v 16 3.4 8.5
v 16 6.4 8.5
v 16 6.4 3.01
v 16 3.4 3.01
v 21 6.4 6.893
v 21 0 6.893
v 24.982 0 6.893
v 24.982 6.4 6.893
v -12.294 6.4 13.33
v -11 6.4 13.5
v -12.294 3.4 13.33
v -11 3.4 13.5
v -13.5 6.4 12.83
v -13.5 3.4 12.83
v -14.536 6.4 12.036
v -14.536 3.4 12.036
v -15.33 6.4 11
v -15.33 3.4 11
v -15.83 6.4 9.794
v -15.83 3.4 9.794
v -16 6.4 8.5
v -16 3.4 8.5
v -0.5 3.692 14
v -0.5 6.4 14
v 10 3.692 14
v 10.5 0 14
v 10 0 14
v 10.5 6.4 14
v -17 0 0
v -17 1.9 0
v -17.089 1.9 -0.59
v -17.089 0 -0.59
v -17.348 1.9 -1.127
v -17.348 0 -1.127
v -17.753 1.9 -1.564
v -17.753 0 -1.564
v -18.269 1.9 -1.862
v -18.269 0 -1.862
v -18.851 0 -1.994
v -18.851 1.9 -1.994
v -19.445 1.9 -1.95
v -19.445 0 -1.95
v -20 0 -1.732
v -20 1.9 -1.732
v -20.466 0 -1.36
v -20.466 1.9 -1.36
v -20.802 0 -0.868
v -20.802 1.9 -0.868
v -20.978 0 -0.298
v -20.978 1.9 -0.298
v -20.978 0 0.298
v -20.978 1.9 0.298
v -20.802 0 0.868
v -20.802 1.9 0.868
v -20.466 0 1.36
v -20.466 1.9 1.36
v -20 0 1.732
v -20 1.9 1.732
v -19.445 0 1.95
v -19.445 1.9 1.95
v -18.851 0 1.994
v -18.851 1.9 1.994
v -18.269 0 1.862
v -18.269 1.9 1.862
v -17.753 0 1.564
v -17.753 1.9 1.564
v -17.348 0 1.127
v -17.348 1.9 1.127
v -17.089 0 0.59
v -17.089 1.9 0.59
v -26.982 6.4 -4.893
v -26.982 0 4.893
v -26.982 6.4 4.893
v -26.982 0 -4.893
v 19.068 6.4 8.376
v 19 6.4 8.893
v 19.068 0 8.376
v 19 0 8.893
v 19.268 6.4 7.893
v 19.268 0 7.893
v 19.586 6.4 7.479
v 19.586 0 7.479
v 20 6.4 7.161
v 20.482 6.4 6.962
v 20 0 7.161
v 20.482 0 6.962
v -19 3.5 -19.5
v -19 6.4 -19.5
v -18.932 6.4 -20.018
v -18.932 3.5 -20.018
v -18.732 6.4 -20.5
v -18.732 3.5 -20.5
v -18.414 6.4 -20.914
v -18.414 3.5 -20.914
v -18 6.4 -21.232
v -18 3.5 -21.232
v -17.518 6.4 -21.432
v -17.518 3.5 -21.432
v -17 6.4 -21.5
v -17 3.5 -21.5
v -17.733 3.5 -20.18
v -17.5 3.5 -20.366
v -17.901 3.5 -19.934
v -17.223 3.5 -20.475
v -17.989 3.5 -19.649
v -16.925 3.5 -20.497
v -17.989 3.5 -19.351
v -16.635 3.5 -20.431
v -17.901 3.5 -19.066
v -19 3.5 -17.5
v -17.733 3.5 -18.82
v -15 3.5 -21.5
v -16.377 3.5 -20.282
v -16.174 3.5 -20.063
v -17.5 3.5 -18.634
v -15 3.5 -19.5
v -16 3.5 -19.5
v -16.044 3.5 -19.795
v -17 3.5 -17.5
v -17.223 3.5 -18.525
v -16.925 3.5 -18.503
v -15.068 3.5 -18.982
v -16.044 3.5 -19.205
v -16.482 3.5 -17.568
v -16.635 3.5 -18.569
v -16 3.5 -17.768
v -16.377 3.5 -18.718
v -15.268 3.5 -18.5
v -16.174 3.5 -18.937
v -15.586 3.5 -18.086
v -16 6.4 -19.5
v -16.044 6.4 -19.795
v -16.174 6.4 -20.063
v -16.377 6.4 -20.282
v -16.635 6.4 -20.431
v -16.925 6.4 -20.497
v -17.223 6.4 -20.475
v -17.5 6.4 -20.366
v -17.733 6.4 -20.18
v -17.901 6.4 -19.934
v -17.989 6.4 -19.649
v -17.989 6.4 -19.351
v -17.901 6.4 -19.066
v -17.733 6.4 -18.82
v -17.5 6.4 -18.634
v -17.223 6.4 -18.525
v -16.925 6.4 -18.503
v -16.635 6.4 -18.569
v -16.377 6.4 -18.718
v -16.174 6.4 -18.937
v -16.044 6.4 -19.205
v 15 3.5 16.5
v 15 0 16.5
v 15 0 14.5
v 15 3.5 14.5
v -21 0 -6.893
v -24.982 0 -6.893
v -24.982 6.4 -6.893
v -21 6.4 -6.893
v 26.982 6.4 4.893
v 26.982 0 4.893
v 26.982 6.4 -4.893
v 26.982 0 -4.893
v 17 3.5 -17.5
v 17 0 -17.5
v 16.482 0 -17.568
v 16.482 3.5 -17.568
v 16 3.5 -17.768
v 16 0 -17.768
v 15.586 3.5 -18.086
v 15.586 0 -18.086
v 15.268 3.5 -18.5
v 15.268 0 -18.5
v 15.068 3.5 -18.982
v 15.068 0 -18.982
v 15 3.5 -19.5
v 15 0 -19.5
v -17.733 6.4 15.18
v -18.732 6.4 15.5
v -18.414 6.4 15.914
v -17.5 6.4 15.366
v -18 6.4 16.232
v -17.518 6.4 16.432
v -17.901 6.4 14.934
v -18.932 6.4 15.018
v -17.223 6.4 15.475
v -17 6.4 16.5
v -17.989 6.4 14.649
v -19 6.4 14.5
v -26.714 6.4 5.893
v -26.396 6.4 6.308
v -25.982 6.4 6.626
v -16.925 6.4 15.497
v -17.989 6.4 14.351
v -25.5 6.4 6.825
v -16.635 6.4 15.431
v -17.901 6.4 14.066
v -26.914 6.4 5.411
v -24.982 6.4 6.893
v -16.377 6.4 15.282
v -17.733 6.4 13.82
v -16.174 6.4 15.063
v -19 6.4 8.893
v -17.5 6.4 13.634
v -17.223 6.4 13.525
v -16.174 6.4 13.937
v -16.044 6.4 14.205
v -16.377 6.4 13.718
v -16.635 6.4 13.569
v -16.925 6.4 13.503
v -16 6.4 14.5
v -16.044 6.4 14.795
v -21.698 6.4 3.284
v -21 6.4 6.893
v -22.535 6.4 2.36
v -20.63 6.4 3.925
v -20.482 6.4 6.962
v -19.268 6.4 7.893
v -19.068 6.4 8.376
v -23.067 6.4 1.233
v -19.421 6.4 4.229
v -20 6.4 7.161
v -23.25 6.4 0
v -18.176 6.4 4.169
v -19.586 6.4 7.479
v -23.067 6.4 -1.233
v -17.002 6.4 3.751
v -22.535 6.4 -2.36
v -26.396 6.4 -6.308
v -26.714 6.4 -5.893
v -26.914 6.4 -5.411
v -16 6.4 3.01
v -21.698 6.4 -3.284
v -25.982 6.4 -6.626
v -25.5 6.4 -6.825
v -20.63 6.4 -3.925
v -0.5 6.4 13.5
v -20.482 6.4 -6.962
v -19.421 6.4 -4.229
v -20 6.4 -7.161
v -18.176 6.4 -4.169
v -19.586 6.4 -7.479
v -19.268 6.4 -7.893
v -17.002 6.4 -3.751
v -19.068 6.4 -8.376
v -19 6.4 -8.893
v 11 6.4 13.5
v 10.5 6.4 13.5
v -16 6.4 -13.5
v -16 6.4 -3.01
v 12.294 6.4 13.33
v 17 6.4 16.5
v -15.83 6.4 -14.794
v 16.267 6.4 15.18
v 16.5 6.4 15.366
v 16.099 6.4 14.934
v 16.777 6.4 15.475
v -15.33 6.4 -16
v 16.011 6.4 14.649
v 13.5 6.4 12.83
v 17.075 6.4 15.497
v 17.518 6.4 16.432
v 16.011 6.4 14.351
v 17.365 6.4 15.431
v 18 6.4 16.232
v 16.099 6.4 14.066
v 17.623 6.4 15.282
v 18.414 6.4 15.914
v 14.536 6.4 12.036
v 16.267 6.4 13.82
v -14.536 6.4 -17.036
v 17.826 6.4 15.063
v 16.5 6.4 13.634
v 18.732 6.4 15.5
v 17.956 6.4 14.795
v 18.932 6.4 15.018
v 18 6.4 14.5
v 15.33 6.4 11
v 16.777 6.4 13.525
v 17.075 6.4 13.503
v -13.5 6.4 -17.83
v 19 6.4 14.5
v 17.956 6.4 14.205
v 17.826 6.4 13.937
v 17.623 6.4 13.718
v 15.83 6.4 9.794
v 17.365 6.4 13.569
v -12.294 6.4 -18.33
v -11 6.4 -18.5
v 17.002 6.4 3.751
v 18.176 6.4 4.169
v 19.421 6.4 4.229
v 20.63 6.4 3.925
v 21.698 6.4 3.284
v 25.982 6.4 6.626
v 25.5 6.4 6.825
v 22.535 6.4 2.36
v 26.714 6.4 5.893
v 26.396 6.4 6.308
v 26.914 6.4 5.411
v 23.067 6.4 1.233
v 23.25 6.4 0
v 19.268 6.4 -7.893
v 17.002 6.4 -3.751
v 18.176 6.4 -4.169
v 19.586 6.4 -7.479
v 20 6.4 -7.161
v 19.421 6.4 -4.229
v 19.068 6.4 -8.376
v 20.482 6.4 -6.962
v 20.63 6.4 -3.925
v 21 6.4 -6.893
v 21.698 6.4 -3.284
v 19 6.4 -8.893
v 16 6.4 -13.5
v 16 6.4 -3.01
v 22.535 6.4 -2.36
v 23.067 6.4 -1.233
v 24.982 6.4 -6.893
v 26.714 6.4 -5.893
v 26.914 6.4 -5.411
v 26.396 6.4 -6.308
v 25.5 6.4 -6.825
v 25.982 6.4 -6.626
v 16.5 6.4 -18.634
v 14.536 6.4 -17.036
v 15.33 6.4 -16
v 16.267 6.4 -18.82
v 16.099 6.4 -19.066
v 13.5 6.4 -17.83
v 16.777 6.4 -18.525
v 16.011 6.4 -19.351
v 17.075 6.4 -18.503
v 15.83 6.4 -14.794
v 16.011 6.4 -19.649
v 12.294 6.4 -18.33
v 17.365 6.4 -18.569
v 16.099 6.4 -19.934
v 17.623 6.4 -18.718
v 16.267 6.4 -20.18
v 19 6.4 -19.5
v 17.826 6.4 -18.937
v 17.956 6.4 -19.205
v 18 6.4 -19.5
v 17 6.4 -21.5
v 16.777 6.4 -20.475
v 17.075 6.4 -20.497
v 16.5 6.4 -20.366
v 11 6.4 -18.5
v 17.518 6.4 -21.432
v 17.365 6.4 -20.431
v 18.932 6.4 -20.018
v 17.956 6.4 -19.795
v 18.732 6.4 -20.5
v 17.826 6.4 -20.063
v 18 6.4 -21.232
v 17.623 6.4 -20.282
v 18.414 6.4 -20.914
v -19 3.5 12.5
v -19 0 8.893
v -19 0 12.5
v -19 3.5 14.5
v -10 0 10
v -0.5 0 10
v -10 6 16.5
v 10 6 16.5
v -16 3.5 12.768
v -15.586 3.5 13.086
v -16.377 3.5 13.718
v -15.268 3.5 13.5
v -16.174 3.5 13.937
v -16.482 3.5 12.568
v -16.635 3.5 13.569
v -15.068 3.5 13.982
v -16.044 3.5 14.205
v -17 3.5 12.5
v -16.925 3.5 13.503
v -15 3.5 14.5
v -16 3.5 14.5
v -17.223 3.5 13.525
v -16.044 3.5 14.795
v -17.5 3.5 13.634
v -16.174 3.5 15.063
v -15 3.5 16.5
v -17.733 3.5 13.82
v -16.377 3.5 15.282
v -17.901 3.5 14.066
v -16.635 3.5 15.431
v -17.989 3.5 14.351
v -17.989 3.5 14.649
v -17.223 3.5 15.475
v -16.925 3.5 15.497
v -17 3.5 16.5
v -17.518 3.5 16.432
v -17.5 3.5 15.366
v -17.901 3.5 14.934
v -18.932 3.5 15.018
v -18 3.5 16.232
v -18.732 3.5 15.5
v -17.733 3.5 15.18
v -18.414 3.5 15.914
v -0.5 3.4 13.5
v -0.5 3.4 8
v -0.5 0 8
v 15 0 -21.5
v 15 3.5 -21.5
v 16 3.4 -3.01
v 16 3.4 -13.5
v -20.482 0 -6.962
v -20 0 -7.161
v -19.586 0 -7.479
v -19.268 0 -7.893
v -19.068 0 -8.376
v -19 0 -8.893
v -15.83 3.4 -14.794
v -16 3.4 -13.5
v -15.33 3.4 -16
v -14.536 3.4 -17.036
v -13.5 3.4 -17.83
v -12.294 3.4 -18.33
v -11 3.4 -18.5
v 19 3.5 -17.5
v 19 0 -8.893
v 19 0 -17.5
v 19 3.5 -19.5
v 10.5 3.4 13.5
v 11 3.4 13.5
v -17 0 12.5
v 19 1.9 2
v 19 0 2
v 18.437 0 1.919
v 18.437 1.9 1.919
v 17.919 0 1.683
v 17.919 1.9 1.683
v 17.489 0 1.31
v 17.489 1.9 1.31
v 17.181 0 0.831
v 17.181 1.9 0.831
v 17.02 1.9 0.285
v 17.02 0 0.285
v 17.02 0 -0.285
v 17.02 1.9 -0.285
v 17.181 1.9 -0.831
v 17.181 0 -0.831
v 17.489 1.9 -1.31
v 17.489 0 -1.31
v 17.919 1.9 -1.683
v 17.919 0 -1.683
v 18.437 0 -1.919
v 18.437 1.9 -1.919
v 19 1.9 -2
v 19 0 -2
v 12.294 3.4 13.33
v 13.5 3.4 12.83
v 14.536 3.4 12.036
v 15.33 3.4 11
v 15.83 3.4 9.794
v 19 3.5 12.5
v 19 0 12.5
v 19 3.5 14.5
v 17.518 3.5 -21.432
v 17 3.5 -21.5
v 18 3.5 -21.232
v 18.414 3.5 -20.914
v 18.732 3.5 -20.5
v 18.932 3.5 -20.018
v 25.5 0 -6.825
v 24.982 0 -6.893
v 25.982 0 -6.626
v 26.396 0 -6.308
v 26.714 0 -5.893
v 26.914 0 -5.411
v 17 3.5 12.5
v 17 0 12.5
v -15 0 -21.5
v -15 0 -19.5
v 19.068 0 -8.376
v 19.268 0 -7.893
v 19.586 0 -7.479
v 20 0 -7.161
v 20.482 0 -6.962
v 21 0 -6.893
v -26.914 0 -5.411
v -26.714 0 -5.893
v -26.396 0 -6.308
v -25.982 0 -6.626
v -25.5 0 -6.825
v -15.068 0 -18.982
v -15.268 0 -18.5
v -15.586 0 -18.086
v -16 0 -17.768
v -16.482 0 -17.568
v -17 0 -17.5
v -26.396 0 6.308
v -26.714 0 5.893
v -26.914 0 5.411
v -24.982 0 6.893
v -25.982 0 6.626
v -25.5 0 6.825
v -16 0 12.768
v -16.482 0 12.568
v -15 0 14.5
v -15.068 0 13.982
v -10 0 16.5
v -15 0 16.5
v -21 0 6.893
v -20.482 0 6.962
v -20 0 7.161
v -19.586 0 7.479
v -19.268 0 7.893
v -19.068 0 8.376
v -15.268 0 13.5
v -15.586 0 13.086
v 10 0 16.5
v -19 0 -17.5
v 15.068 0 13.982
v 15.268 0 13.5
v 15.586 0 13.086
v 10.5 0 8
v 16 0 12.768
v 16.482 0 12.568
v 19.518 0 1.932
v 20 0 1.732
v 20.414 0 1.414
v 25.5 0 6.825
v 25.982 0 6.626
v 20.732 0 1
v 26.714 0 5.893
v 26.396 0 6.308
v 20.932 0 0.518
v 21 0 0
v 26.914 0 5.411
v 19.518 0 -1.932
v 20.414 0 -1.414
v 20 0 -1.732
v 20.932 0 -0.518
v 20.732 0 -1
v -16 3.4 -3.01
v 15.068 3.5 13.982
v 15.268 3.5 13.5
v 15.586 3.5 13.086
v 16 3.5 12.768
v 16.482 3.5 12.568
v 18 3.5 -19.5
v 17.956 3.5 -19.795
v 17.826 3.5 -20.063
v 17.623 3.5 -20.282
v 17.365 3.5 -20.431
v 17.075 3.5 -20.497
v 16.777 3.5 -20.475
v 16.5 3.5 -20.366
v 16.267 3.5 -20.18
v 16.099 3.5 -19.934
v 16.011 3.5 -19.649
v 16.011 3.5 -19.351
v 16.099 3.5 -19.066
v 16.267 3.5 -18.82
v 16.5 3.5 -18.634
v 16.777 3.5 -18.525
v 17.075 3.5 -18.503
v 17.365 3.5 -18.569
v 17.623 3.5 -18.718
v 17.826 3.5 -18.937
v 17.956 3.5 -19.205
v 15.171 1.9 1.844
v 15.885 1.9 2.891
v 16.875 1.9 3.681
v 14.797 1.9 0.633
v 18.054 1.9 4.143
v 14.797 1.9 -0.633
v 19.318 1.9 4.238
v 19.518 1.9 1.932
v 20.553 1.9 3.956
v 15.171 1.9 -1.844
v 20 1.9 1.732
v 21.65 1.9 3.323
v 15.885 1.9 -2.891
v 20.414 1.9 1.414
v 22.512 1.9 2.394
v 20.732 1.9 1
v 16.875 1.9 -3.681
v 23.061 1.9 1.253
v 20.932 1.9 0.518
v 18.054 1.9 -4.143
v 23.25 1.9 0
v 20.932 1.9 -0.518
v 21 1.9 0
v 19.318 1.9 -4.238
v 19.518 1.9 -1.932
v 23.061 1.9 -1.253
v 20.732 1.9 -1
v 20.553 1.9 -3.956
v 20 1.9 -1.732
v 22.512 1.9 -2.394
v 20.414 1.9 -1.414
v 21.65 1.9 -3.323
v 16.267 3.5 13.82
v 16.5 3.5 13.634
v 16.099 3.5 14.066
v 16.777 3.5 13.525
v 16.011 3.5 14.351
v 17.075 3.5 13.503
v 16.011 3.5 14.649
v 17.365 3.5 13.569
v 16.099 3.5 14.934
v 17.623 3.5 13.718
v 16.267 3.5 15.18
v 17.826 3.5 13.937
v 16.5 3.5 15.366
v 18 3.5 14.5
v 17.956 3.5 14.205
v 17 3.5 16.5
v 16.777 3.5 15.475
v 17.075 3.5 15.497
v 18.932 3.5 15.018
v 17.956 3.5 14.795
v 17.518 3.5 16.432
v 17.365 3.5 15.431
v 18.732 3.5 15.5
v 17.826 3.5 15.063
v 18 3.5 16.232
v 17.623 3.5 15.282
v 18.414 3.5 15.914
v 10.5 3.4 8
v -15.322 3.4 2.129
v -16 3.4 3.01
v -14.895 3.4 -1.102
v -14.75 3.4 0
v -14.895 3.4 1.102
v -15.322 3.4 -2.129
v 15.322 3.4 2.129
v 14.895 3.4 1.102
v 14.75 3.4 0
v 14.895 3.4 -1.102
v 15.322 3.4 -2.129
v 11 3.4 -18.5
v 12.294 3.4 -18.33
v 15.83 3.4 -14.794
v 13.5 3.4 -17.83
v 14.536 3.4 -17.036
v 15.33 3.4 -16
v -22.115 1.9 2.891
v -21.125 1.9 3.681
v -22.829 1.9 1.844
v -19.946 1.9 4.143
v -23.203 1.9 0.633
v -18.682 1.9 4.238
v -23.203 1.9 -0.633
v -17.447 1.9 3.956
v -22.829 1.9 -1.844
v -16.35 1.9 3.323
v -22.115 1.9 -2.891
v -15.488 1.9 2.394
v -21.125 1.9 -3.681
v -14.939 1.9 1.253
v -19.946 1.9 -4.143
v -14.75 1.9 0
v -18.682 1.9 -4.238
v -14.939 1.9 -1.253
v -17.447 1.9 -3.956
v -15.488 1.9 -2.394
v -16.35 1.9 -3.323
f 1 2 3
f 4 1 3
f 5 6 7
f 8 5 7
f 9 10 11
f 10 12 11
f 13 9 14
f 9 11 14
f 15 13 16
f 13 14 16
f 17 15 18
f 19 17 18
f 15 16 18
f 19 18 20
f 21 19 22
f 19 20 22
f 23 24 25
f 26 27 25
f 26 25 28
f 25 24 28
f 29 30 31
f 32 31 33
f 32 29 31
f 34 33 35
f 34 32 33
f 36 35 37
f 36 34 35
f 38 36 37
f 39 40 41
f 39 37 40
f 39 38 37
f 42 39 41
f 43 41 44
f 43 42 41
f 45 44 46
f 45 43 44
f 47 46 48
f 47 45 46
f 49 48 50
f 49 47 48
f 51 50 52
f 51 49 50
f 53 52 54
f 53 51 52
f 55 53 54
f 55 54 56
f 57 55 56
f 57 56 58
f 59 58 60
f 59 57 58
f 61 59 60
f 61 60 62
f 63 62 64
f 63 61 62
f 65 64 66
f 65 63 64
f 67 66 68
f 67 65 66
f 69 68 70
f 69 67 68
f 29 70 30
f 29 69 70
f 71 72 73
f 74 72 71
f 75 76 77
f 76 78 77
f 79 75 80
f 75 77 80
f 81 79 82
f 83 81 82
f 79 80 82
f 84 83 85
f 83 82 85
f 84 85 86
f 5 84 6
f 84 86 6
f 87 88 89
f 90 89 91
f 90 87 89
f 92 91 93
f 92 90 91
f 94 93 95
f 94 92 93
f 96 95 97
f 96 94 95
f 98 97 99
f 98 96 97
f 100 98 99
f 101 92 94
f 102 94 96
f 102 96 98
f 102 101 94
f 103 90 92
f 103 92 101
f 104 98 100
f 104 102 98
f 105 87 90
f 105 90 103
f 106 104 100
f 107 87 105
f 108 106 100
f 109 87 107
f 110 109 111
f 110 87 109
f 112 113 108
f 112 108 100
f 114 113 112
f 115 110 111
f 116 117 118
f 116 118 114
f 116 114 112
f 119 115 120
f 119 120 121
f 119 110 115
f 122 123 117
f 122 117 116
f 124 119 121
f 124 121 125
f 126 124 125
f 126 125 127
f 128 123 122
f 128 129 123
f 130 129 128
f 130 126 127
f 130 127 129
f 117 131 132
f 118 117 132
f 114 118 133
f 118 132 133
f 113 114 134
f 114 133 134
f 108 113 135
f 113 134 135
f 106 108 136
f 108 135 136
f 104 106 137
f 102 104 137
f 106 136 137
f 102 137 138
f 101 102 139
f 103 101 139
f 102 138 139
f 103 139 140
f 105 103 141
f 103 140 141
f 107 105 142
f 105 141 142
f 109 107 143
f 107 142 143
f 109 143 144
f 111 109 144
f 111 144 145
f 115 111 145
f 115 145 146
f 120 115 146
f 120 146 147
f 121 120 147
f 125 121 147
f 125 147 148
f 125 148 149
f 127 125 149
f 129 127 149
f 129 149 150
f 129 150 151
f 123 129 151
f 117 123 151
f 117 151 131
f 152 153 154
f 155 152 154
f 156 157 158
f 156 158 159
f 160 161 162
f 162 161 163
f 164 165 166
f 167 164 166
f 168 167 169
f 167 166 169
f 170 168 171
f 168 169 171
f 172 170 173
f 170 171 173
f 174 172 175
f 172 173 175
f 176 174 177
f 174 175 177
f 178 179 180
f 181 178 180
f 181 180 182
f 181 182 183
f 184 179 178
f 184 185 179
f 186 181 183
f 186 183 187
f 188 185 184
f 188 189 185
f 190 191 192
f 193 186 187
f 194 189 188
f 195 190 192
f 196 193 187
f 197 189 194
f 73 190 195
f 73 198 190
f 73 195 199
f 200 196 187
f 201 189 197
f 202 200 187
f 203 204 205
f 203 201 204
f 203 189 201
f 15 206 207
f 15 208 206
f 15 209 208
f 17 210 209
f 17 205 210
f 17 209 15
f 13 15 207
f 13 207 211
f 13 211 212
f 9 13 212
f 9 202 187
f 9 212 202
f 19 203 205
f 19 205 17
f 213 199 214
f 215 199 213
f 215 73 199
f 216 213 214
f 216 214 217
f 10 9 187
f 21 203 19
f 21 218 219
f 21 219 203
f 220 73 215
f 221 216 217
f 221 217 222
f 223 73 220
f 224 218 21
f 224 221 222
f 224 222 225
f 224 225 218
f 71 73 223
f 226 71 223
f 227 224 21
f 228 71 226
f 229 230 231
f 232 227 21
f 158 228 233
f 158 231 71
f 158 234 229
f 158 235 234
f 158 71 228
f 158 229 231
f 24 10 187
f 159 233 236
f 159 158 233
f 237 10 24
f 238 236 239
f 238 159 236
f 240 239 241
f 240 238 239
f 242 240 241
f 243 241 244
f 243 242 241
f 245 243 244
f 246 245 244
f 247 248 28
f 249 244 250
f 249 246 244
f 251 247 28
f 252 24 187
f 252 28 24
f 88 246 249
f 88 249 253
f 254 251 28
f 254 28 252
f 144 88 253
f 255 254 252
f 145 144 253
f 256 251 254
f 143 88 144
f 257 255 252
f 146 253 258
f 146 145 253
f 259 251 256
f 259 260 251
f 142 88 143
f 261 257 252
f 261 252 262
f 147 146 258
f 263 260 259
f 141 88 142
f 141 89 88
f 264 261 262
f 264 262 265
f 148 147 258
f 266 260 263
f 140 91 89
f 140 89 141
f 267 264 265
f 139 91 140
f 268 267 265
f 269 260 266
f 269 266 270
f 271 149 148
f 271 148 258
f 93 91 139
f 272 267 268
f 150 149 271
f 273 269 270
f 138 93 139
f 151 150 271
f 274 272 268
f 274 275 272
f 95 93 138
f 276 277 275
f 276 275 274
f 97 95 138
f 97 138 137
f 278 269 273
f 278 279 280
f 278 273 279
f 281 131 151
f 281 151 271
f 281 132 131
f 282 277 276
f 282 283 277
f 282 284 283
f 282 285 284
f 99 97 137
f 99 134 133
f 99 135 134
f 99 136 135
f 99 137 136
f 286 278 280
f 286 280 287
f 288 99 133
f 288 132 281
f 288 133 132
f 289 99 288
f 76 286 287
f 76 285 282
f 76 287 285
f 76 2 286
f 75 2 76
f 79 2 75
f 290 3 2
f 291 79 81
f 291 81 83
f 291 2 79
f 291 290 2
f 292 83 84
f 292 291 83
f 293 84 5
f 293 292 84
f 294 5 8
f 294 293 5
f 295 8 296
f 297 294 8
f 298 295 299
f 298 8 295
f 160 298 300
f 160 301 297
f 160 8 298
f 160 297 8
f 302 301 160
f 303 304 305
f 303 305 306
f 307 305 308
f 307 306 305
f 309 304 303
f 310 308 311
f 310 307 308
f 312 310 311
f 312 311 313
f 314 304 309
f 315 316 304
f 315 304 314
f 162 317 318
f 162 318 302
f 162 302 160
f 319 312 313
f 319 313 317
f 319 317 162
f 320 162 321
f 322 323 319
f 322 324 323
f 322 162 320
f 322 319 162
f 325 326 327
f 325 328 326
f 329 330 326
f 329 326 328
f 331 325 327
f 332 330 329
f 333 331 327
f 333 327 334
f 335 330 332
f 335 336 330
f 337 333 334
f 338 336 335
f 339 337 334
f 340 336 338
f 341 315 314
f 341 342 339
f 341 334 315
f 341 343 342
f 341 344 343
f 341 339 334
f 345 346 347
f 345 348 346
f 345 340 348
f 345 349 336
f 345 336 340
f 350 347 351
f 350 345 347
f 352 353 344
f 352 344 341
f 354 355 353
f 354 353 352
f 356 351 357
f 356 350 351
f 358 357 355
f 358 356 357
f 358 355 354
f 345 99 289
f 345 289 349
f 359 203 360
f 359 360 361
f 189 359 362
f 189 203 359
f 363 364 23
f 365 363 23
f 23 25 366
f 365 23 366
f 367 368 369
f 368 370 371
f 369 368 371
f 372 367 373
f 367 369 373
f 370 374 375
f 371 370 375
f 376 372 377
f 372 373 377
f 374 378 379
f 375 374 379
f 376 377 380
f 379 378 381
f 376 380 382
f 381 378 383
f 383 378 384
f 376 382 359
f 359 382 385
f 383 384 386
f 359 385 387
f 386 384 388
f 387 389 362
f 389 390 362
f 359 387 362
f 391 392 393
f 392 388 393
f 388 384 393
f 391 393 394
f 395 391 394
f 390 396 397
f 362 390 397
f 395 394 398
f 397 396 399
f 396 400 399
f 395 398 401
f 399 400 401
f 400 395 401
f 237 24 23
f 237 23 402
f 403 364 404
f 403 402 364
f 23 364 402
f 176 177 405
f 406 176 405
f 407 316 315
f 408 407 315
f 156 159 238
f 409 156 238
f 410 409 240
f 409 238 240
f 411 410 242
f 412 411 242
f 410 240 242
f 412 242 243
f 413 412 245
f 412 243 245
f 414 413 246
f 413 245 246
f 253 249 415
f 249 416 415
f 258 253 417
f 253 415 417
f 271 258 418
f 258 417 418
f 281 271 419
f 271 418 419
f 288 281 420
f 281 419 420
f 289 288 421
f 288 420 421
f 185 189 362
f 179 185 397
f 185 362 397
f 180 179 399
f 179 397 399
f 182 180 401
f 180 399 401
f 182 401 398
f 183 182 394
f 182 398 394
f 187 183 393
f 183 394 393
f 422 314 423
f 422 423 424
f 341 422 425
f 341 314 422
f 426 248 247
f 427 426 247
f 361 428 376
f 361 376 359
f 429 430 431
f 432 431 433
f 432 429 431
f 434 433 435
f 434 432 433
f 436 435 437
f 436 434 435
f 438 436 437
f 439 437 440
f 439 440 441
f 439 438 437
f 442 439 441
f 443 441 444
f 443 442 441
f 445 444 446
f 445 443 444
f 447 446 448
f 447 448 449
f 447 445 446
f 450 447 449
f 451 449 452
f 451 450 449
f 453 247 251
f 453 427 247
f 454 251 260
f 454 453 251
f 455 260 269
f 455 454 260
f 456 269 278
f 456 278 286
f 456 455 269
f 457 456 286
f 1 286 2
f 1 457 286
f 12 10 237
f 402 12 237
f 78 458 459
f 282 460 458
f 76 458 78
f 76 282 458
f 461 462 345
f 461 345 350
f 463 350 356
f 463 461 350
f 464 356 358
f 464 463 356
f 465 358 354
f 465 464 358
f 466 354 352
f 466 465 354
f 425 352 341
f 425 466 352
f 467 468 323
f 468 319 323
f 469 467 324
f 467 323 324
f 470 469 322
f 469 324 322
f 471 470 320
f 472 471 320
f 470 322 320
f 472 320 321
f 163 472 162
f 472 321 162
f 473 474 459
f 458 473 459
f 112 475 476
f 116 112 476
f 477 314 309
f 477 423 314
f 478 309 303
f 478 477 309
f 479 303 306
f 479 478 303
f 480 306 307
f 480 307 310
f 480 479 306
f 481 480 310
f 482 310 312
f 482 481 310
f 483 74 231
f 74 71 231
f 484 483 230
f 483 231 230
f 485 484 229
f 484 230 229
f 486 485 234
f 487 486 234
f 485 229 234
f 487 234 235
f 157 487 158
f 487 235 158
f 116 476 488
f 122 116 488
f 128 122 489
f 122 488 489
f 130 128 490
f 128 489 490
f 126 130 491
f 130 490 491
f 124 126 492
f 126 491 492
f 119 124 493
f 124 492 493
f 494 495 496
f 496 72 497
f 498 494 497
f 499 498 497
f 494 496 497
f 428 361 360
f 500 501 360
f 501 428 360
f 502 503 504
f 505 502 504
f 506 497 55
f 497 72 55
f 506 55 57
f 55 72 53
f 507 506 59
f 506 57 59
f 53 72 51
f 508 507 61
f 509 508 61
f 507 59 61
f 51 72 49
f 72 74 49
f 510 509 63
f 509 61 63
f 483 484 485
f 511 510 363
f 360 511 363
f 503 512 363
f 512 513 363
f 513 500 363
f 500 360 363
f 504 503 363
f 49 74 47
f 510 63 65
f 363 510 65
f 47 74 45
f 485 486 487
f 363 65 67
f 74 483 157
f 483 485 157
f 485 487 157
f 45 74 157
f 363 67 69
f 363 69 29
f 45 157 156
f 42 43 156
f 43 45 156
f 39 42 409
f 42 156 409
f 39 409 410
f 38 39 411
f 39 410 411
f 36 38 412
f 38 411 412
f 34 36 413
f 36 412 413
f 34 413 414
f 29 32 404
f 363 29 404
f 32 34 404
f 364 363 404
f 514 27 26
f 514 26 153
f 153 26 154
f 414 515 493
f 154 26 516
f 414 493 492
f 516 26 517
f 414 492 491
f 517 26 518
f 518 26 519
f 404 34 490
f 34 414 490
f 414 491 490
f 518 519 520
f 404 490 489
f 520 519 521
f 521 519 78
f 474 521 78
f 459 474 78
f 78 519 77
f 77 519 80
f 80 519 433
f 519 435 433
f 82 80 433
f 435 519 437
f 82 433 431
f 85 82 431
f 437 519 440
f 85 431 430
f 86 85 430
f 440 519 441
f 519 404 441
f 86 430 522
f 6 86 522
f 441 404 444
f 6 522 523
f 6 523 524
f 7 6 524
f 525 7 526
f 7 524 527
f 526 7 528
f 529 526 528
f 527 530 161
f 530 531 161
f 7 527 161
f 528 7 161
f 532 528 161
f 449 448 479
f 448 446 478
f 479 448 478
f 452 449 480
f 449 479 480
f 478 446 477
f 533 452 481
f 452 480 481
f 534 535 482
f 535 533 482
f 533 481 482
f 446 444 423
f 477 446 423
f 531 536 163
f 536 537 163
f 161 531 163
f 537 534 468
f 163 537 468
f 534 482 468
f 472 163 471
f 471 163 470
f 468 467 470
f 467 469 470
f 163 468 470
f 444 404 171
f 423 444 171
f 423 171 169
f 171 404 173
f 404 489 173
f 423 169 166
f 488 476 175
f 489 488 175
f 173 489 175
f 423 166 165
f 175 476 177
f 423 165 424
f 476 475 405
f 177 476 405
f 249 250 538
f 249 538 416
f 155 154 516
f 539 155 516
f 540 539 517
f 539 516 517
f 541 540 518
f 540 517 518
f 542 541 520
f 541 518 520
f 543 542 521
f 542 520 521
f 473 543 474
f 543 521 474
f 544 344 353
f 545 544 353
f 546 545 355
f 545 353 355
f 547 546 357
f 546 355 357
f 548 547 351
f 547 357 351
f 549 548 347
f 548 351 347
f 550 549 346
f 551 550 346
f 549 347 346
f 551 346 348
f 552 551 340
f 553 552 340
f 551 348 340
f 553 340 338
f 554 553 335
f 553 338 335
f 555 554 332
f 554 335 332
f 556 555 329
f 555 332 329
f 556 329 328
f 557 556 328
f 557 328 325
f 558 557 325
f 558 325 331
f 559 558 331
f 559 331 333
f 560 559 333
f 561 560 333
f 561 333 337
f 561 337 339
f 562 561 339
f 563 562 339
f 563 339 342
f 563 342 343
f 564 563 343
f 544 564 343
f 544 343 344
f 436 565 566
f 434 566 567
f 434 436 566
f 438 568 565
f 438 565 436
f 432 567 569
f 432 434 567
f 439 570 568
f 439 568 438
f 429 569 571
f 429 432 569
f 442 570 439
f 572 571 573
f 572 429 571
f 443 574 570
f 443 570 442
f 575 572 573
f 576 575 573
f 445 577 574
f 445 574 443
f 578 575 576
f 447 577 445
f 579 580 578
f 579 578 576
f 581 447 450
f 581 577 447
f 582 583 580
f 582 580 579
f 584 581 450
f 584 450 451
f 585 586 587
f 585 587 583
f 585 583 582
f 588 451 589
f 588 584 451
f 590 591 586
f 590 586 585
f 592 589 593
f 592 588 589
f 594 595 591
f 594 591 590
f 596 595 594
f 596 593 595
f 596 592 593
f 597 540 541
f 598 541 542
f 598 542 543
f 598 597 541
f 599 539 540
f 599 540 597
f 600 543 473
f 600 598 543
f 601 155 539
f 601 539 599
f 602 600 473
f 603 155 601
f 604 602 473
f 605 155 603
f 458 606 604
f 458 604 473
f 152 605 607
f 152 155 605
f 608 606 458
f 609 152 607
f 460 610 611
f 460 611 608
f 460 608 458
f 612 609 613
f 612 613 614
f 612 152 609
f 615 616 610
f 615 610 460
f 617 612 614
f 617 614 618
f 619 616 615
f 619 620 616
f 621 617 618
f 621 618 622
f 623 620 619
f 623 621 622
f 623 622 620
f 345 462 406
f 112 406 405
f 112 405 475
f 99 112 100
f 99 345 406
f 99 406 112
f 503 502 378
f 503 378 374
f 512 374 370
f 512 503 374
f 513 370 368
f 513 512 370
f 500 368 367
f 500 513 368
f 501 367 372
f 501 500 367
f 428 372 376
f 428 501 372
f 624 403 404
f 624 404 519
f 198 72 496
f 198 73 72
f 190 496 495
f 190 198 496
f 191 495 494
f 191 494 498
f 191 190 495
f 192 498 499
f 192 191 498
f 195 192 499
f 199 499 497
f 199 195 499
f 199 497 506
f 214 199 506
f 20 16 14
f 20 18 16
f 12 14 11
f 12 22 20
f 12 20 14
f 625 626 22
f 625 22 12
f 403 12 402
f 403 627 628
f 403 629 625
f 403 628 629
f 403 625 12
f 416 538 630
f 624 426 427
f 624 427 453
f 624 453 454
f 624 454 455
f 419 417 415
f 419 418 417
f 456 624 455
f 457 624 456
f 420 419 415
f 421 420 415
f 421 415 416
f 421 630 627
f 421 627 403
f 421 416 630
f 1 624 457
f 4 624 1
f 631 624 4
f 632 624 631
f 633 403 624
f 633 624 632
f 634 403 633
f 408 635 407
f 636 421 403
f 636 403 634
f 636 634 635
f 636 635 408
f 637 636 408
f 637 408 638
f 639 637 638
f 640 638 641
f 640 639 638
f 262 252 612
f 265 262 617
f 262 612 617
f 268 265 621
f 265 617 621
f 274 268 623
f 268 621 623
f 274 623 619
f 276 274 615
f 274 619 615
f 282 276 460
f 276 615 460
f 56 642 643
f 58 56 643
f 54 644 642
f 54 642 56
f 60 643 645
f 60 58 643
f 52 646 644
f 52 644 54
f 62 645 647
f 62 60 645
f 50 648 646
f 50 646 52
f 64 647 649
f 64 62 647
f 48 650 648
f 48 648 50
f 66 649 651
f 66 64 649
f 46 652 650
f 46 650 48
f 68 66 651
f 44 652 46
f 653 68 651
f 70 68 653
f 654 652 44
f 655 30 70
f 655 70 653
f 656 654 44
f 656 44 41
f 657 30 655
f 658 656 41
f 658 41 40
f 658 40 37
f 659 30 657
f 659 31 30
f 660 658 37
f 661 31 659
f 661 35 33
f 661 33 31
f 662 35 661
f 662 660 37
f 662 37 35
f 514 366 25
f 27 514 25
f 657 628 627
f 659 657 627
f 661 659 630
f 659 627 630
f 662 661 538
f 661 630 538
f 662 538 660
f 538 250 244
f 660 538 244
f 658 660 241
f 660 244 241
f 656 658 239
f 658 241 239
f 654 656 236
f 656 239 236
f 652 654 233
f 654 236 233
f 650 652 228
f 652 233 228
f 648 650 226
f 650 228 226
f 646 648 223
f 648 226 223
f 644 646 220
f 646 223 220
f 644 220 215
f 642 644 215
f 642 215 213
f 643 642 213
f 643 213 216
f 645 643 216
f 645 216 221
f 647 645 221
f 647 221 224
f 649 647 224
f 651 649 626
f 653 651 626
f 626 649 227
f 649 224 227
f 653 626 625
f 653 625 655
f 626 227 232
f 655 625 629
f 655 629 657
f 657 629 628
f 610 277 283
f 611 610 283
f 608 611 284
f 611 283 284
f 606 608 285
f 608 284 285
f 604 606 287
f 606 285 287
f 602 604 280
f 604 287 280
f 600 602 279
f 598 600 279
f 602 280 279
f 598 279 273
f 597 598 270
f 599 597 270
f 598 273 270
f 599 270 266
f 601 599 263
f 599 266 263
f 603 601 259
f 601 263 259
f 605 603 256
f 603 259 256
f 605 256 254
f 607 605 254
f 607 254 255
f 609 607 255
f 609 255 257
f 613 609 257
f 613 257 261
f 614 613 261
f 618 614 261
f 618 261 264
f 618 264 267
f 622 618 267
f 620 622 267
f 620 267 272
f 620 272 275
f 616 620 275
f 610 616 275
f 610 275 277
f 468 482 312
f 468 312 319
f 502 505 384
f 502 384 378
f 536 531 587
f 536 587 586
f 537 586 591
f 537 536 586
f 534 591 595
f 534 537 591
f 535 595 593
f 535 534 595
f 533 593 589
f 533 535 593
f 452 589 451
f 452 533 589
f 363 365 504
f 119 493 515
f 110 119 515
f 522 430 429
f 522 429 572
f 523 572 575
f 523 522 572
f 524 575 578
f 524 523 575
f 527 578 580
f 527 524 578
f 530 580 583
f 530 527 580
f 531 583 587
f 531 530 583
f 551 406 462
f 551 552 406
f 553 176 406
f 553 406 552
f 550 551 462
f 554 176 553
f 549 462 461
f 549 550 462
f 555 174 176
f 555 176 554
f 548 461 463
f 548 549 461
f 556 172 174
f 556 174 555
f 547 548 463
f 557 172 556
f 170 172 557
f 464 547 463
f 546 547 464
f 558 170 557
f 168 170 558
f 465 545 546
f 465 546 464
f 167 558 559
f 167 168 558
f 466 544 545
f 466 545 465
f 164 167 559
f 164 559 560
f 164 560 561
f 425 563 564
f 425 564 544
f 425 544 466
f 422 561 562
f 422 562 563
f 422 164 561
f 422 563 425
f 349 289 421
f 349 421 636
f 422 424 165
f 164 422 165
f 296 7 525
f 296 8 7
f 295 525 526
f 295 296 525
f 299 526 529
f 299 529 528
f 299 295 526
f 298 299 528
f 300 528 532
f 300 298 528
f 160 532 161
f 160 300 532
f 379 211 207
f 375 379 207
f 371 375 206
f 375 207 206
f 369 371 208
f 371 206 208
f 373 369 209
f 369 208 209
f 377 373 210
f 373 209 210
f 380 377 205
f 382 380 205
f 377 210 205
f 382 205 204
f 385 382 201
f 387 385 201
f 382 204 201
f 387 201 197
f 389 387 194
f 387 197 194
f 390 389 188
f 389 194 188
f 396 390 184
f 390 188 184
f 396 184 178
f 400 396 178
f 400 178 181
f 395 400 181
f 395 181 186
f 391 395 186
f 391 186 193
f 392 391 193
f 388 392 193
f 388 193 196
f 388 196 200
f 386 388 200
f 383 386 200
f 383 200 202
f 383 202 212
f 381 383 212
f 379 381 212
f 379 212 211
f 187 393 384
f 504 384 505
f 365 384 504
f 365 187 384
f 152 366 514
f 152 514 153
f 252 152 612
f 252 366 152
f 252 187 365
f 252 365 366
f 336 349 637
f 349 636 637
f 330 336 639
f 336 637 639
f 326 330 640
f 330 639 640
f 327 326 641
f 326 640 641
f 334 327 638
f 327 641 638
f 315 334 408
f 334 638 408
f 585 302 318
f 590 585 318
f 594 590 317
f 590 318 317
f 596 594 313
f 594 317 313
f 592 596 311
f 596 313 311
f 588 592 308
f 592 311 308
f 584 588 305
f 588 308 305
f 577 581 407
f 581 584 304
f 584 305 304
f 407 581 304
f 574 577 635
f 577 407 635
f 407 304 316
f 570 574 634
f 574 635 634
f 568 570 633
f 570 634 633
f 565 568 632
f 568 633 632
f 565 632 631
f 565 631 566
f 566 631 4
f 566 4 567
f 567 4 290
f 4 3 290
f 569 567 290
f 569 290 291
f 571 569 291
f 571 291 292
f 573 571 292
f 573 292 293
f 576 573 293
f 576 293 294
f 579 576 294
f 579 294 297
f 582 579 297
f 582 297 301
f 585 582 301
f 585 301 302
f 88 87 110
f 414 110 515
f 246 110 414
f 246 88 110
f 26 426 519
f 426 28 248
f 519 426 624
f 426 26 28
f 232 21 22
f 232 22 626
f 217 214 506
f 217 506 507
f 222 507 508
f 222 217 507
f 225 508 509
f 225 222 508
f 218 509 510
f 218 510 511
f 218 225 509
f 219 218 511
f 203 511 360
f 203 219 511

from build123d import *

# Parameters (mm, degrees)
SKETCH1_W           = 53.964084124
SKETCH1_H           = 13.786930342
SKETCH1_R           = 2
BOSS_EXTRUDE1_DEPTH = 6.4
SKETCH3_R           = 1
BOSS_EXTRUDE2_DEPTH = 6.4
SKETCH4_R           = 4.25
CUT_EXTRUDE1_DEPTH  = 4.5
SKETCH5_W           = 11
SKETCH5_H           = 6
CUT_EXTRUDE2_DEPTH  = 7.4
SKETCH6_W           = 32
SKETCH6_H           = 32
CUT_EXTRUDE3_DEPTH  = 3
FILLET2_R           = 2
FILLET3_R           = 5
CUT_EXTRUDE4_DEPTH  = 3.5
CUT_EXTRUDE5_DEPTH  = 10


with BuildPart() as part:
    # Sketch1 → Boss-Extrude1 (new body)
    with BuildSketch(Plane(origin=(0, 0, 0), x_dir=(1, 0, 0), z_dir=(0, 1, 0))):
        Rectangle(SKETCH1_W, SKETCH1_H)
        with Locations((-19, 0)):
            Circle(SKETCH1_R, mode=Mode.SUBTRACT)
        with Locations((19, 0)):
            Circle(SKETCH1_R, mode=Mode.SUBTRACT)
    extrude(amount=BOSS_EXTRUDE1_DEPTH)

    # Sketch3 → Boss-Extrude2 (add)
    with BuildSketch(Plane(origin=(0, 6.4, 0), x_dir=(1, 0, 0), z_dir=(0, 1, 0))):
        with BuildLine():
            Line((19, 2), (19, 21.5))
            Line((19, 21.5), (-19, 21.5))
            Line((-19, 21.5), (-19, 2))
            ThreePointArc((-19, 2), (-17, 0), (-19, -2))
            Line((-19, -2), (-19, -16.5))
            Line((-19, -16.5), (19, -16.5))
            Line((19, -16.5), (19, -2))
            ThreePointArc((19, -2), (17, 0), (19, 2))
        make_face()
        with Locations((-17, 19.5)):
            Circle(SKETCH3_R, mode=Mode.SUBTRACT)
        with Locations((17, 19.5)):
            Circle(SKETCH3_R, mode=Mode.SUBTRACT)
        with Locations((-17, -14.5)):
            Circle(SKETCH3_R, mode=Mode.SUBTRACT)
        with Locations((17, -14.5)):
            Circle(SKETCH3_R, mode=Mode.SUBTRACT)
    extrude(amount=-BOSS_EXTRUDE2_DEPTH)

    # Sketch4 → Cut-Extrude1 (cut)
    with BuildSketch(Plane(origin=(0, 6.4, 0), x_dir=(1, 0, 0), z_dir=(0, 1, 0))):
        with Locations((-19, 0)):
            Circle(SKETCH4_R)
        with Locations((19, 0)):
            Circle(SKETCH4_R)
    extrude(amount=-CUT_EXTRUDE1_DEPTH, mode=Mode.SUBTRACT)

    # Sketch5 → Cut-Extrude2 (cut, through all)
    with BuildSketch(Plane(origin=(0, 6.4, 0), x_dir=(1, 0, 0), z_dir=(0, 1, 0))):
        with Locations((5, -11)):
            Rectangle(SKETCH5_W, SKETCH5_H)
    extrude(amount=-CUT_EXTRUDE2_DEPTH, mode=Mode.SUBTRACT)

    # Sketch6 → Cut-Extrude3 (cut)
    with BuildSketch(Plane(origin=(0, 6.4, 0), x_dir=(1, 0, 0), z_dir=(0, 1, 0))):
        with Locations((0, 2.5)):
            Rectangle(SKETCH6_W, SKETCH6_H)
    extrude(amount=-CUT_EXTRUDE3_DEPTH, mode=Mode.SUBTRACT)

    # Fillet2
    fillet2_edges = [part.edges().sort_by_distance(p)[0] for p in [
        (-19, 3.2, 16.5),
        (19, 3.2, -21.5),
        (-19, 3.2, -21.5),
        (19, 3.2, -6.893465171),
        (19, 3.2, 6.893465171),
        (19, 3.2, 16.5),
        (-19, 3.2, 6.893465171),
        (-19, 3.2, -6.893465171),
        (26.982042062, 3.2, 6.893465171),
        (-26.982042062, 3.2, 6.893465171),
        (-26.982042062, 3.2, -6.893465171),
        (26.982042062, 3.2, -6.893465171),
    ]]
    fillet(fillet2_edges, radius=FILLET2_R)

    # Fillet3
    fillet3_edges = [part.edges().sort_by_distance(p)[0] for p in [
        (16, 4.9, -18.5),
        (-16, 4.9, 13.5),
        (16, 4.9, 13.5),
        (-16, 4.9, -18.5),
    ]]
    fillet(fillet3_edges, radius=FILLET3_R)

    # Sketch7 → Cut-Extrude4 (cut)
    with BuildSketch(Plane.XZ):
        with BuildLine():
            Line((-17, -17.5), (-19, -17.5))
            Line((-19, -17.5), (-19, -21.5))
            Line((-19, -21.5), (-15, -21.5))
            Line((-15, -21.5), (-15, -19.5))
            ThreePointArc((-15, -19.5), (-15.585786438, -18.085786438), (-17, -17.5))
        make_face()
        with BuildLine():
            Line((15, -19.5), (15, -21.5))
            Line((15, -21.5), (19, -21.5))
            Line((19, -21.5), (19, -17.5))
            Line((19, -17.5), (17, -17.5))
            ThreePointArc((17, -17.5), (15.585786438, -18.085786438), (15, -19.5))
        make_face()
        with BuildLine():
            Line((-17, 12.5), (-19, 12.5))
            Line((-19, 12.5), (-19, 16.5))
            Line((-19, 16.5), (-15, 16.5))
            Line((-15, 16.5), (-15, 14.5))
            ThreePointArc((-15, 14.5), (-15.585786438, 13.085786438), (-17, 12.5))
        make_face()
        with BuildLine():
            Line((17, 12.5), (19, 12.5))
            Line((19, 12.5), (19, 16.5))
            Line((19, 16.5), (15, 16.5))
            Line((15, 16.5), (15, 14.5))
            ThreePointArc((15, 14.5), (15.585786438, 13.085786438), (17, 12.5))
        make_face()
    extrude(amount=-CUT_EXTRUDE4_DEPTH, mode=Mode.SUBTRACT)

    # Sketch8 → Cut-Extrude5 (cut, symmetric)
    with BuildSketch(Plane(origin=(0, 0, 0), x_dir=(0, 0, -1), z_dir=(1, 0, 0))):
        Polygon((-10, 0), (-16.5, 6), (-16.5, 0), align=None)
    extrude(amount=CUT_EXTRUDE5_DEPTH, both=True, mode=Mode.SUBTRACT)


solid = part.part
